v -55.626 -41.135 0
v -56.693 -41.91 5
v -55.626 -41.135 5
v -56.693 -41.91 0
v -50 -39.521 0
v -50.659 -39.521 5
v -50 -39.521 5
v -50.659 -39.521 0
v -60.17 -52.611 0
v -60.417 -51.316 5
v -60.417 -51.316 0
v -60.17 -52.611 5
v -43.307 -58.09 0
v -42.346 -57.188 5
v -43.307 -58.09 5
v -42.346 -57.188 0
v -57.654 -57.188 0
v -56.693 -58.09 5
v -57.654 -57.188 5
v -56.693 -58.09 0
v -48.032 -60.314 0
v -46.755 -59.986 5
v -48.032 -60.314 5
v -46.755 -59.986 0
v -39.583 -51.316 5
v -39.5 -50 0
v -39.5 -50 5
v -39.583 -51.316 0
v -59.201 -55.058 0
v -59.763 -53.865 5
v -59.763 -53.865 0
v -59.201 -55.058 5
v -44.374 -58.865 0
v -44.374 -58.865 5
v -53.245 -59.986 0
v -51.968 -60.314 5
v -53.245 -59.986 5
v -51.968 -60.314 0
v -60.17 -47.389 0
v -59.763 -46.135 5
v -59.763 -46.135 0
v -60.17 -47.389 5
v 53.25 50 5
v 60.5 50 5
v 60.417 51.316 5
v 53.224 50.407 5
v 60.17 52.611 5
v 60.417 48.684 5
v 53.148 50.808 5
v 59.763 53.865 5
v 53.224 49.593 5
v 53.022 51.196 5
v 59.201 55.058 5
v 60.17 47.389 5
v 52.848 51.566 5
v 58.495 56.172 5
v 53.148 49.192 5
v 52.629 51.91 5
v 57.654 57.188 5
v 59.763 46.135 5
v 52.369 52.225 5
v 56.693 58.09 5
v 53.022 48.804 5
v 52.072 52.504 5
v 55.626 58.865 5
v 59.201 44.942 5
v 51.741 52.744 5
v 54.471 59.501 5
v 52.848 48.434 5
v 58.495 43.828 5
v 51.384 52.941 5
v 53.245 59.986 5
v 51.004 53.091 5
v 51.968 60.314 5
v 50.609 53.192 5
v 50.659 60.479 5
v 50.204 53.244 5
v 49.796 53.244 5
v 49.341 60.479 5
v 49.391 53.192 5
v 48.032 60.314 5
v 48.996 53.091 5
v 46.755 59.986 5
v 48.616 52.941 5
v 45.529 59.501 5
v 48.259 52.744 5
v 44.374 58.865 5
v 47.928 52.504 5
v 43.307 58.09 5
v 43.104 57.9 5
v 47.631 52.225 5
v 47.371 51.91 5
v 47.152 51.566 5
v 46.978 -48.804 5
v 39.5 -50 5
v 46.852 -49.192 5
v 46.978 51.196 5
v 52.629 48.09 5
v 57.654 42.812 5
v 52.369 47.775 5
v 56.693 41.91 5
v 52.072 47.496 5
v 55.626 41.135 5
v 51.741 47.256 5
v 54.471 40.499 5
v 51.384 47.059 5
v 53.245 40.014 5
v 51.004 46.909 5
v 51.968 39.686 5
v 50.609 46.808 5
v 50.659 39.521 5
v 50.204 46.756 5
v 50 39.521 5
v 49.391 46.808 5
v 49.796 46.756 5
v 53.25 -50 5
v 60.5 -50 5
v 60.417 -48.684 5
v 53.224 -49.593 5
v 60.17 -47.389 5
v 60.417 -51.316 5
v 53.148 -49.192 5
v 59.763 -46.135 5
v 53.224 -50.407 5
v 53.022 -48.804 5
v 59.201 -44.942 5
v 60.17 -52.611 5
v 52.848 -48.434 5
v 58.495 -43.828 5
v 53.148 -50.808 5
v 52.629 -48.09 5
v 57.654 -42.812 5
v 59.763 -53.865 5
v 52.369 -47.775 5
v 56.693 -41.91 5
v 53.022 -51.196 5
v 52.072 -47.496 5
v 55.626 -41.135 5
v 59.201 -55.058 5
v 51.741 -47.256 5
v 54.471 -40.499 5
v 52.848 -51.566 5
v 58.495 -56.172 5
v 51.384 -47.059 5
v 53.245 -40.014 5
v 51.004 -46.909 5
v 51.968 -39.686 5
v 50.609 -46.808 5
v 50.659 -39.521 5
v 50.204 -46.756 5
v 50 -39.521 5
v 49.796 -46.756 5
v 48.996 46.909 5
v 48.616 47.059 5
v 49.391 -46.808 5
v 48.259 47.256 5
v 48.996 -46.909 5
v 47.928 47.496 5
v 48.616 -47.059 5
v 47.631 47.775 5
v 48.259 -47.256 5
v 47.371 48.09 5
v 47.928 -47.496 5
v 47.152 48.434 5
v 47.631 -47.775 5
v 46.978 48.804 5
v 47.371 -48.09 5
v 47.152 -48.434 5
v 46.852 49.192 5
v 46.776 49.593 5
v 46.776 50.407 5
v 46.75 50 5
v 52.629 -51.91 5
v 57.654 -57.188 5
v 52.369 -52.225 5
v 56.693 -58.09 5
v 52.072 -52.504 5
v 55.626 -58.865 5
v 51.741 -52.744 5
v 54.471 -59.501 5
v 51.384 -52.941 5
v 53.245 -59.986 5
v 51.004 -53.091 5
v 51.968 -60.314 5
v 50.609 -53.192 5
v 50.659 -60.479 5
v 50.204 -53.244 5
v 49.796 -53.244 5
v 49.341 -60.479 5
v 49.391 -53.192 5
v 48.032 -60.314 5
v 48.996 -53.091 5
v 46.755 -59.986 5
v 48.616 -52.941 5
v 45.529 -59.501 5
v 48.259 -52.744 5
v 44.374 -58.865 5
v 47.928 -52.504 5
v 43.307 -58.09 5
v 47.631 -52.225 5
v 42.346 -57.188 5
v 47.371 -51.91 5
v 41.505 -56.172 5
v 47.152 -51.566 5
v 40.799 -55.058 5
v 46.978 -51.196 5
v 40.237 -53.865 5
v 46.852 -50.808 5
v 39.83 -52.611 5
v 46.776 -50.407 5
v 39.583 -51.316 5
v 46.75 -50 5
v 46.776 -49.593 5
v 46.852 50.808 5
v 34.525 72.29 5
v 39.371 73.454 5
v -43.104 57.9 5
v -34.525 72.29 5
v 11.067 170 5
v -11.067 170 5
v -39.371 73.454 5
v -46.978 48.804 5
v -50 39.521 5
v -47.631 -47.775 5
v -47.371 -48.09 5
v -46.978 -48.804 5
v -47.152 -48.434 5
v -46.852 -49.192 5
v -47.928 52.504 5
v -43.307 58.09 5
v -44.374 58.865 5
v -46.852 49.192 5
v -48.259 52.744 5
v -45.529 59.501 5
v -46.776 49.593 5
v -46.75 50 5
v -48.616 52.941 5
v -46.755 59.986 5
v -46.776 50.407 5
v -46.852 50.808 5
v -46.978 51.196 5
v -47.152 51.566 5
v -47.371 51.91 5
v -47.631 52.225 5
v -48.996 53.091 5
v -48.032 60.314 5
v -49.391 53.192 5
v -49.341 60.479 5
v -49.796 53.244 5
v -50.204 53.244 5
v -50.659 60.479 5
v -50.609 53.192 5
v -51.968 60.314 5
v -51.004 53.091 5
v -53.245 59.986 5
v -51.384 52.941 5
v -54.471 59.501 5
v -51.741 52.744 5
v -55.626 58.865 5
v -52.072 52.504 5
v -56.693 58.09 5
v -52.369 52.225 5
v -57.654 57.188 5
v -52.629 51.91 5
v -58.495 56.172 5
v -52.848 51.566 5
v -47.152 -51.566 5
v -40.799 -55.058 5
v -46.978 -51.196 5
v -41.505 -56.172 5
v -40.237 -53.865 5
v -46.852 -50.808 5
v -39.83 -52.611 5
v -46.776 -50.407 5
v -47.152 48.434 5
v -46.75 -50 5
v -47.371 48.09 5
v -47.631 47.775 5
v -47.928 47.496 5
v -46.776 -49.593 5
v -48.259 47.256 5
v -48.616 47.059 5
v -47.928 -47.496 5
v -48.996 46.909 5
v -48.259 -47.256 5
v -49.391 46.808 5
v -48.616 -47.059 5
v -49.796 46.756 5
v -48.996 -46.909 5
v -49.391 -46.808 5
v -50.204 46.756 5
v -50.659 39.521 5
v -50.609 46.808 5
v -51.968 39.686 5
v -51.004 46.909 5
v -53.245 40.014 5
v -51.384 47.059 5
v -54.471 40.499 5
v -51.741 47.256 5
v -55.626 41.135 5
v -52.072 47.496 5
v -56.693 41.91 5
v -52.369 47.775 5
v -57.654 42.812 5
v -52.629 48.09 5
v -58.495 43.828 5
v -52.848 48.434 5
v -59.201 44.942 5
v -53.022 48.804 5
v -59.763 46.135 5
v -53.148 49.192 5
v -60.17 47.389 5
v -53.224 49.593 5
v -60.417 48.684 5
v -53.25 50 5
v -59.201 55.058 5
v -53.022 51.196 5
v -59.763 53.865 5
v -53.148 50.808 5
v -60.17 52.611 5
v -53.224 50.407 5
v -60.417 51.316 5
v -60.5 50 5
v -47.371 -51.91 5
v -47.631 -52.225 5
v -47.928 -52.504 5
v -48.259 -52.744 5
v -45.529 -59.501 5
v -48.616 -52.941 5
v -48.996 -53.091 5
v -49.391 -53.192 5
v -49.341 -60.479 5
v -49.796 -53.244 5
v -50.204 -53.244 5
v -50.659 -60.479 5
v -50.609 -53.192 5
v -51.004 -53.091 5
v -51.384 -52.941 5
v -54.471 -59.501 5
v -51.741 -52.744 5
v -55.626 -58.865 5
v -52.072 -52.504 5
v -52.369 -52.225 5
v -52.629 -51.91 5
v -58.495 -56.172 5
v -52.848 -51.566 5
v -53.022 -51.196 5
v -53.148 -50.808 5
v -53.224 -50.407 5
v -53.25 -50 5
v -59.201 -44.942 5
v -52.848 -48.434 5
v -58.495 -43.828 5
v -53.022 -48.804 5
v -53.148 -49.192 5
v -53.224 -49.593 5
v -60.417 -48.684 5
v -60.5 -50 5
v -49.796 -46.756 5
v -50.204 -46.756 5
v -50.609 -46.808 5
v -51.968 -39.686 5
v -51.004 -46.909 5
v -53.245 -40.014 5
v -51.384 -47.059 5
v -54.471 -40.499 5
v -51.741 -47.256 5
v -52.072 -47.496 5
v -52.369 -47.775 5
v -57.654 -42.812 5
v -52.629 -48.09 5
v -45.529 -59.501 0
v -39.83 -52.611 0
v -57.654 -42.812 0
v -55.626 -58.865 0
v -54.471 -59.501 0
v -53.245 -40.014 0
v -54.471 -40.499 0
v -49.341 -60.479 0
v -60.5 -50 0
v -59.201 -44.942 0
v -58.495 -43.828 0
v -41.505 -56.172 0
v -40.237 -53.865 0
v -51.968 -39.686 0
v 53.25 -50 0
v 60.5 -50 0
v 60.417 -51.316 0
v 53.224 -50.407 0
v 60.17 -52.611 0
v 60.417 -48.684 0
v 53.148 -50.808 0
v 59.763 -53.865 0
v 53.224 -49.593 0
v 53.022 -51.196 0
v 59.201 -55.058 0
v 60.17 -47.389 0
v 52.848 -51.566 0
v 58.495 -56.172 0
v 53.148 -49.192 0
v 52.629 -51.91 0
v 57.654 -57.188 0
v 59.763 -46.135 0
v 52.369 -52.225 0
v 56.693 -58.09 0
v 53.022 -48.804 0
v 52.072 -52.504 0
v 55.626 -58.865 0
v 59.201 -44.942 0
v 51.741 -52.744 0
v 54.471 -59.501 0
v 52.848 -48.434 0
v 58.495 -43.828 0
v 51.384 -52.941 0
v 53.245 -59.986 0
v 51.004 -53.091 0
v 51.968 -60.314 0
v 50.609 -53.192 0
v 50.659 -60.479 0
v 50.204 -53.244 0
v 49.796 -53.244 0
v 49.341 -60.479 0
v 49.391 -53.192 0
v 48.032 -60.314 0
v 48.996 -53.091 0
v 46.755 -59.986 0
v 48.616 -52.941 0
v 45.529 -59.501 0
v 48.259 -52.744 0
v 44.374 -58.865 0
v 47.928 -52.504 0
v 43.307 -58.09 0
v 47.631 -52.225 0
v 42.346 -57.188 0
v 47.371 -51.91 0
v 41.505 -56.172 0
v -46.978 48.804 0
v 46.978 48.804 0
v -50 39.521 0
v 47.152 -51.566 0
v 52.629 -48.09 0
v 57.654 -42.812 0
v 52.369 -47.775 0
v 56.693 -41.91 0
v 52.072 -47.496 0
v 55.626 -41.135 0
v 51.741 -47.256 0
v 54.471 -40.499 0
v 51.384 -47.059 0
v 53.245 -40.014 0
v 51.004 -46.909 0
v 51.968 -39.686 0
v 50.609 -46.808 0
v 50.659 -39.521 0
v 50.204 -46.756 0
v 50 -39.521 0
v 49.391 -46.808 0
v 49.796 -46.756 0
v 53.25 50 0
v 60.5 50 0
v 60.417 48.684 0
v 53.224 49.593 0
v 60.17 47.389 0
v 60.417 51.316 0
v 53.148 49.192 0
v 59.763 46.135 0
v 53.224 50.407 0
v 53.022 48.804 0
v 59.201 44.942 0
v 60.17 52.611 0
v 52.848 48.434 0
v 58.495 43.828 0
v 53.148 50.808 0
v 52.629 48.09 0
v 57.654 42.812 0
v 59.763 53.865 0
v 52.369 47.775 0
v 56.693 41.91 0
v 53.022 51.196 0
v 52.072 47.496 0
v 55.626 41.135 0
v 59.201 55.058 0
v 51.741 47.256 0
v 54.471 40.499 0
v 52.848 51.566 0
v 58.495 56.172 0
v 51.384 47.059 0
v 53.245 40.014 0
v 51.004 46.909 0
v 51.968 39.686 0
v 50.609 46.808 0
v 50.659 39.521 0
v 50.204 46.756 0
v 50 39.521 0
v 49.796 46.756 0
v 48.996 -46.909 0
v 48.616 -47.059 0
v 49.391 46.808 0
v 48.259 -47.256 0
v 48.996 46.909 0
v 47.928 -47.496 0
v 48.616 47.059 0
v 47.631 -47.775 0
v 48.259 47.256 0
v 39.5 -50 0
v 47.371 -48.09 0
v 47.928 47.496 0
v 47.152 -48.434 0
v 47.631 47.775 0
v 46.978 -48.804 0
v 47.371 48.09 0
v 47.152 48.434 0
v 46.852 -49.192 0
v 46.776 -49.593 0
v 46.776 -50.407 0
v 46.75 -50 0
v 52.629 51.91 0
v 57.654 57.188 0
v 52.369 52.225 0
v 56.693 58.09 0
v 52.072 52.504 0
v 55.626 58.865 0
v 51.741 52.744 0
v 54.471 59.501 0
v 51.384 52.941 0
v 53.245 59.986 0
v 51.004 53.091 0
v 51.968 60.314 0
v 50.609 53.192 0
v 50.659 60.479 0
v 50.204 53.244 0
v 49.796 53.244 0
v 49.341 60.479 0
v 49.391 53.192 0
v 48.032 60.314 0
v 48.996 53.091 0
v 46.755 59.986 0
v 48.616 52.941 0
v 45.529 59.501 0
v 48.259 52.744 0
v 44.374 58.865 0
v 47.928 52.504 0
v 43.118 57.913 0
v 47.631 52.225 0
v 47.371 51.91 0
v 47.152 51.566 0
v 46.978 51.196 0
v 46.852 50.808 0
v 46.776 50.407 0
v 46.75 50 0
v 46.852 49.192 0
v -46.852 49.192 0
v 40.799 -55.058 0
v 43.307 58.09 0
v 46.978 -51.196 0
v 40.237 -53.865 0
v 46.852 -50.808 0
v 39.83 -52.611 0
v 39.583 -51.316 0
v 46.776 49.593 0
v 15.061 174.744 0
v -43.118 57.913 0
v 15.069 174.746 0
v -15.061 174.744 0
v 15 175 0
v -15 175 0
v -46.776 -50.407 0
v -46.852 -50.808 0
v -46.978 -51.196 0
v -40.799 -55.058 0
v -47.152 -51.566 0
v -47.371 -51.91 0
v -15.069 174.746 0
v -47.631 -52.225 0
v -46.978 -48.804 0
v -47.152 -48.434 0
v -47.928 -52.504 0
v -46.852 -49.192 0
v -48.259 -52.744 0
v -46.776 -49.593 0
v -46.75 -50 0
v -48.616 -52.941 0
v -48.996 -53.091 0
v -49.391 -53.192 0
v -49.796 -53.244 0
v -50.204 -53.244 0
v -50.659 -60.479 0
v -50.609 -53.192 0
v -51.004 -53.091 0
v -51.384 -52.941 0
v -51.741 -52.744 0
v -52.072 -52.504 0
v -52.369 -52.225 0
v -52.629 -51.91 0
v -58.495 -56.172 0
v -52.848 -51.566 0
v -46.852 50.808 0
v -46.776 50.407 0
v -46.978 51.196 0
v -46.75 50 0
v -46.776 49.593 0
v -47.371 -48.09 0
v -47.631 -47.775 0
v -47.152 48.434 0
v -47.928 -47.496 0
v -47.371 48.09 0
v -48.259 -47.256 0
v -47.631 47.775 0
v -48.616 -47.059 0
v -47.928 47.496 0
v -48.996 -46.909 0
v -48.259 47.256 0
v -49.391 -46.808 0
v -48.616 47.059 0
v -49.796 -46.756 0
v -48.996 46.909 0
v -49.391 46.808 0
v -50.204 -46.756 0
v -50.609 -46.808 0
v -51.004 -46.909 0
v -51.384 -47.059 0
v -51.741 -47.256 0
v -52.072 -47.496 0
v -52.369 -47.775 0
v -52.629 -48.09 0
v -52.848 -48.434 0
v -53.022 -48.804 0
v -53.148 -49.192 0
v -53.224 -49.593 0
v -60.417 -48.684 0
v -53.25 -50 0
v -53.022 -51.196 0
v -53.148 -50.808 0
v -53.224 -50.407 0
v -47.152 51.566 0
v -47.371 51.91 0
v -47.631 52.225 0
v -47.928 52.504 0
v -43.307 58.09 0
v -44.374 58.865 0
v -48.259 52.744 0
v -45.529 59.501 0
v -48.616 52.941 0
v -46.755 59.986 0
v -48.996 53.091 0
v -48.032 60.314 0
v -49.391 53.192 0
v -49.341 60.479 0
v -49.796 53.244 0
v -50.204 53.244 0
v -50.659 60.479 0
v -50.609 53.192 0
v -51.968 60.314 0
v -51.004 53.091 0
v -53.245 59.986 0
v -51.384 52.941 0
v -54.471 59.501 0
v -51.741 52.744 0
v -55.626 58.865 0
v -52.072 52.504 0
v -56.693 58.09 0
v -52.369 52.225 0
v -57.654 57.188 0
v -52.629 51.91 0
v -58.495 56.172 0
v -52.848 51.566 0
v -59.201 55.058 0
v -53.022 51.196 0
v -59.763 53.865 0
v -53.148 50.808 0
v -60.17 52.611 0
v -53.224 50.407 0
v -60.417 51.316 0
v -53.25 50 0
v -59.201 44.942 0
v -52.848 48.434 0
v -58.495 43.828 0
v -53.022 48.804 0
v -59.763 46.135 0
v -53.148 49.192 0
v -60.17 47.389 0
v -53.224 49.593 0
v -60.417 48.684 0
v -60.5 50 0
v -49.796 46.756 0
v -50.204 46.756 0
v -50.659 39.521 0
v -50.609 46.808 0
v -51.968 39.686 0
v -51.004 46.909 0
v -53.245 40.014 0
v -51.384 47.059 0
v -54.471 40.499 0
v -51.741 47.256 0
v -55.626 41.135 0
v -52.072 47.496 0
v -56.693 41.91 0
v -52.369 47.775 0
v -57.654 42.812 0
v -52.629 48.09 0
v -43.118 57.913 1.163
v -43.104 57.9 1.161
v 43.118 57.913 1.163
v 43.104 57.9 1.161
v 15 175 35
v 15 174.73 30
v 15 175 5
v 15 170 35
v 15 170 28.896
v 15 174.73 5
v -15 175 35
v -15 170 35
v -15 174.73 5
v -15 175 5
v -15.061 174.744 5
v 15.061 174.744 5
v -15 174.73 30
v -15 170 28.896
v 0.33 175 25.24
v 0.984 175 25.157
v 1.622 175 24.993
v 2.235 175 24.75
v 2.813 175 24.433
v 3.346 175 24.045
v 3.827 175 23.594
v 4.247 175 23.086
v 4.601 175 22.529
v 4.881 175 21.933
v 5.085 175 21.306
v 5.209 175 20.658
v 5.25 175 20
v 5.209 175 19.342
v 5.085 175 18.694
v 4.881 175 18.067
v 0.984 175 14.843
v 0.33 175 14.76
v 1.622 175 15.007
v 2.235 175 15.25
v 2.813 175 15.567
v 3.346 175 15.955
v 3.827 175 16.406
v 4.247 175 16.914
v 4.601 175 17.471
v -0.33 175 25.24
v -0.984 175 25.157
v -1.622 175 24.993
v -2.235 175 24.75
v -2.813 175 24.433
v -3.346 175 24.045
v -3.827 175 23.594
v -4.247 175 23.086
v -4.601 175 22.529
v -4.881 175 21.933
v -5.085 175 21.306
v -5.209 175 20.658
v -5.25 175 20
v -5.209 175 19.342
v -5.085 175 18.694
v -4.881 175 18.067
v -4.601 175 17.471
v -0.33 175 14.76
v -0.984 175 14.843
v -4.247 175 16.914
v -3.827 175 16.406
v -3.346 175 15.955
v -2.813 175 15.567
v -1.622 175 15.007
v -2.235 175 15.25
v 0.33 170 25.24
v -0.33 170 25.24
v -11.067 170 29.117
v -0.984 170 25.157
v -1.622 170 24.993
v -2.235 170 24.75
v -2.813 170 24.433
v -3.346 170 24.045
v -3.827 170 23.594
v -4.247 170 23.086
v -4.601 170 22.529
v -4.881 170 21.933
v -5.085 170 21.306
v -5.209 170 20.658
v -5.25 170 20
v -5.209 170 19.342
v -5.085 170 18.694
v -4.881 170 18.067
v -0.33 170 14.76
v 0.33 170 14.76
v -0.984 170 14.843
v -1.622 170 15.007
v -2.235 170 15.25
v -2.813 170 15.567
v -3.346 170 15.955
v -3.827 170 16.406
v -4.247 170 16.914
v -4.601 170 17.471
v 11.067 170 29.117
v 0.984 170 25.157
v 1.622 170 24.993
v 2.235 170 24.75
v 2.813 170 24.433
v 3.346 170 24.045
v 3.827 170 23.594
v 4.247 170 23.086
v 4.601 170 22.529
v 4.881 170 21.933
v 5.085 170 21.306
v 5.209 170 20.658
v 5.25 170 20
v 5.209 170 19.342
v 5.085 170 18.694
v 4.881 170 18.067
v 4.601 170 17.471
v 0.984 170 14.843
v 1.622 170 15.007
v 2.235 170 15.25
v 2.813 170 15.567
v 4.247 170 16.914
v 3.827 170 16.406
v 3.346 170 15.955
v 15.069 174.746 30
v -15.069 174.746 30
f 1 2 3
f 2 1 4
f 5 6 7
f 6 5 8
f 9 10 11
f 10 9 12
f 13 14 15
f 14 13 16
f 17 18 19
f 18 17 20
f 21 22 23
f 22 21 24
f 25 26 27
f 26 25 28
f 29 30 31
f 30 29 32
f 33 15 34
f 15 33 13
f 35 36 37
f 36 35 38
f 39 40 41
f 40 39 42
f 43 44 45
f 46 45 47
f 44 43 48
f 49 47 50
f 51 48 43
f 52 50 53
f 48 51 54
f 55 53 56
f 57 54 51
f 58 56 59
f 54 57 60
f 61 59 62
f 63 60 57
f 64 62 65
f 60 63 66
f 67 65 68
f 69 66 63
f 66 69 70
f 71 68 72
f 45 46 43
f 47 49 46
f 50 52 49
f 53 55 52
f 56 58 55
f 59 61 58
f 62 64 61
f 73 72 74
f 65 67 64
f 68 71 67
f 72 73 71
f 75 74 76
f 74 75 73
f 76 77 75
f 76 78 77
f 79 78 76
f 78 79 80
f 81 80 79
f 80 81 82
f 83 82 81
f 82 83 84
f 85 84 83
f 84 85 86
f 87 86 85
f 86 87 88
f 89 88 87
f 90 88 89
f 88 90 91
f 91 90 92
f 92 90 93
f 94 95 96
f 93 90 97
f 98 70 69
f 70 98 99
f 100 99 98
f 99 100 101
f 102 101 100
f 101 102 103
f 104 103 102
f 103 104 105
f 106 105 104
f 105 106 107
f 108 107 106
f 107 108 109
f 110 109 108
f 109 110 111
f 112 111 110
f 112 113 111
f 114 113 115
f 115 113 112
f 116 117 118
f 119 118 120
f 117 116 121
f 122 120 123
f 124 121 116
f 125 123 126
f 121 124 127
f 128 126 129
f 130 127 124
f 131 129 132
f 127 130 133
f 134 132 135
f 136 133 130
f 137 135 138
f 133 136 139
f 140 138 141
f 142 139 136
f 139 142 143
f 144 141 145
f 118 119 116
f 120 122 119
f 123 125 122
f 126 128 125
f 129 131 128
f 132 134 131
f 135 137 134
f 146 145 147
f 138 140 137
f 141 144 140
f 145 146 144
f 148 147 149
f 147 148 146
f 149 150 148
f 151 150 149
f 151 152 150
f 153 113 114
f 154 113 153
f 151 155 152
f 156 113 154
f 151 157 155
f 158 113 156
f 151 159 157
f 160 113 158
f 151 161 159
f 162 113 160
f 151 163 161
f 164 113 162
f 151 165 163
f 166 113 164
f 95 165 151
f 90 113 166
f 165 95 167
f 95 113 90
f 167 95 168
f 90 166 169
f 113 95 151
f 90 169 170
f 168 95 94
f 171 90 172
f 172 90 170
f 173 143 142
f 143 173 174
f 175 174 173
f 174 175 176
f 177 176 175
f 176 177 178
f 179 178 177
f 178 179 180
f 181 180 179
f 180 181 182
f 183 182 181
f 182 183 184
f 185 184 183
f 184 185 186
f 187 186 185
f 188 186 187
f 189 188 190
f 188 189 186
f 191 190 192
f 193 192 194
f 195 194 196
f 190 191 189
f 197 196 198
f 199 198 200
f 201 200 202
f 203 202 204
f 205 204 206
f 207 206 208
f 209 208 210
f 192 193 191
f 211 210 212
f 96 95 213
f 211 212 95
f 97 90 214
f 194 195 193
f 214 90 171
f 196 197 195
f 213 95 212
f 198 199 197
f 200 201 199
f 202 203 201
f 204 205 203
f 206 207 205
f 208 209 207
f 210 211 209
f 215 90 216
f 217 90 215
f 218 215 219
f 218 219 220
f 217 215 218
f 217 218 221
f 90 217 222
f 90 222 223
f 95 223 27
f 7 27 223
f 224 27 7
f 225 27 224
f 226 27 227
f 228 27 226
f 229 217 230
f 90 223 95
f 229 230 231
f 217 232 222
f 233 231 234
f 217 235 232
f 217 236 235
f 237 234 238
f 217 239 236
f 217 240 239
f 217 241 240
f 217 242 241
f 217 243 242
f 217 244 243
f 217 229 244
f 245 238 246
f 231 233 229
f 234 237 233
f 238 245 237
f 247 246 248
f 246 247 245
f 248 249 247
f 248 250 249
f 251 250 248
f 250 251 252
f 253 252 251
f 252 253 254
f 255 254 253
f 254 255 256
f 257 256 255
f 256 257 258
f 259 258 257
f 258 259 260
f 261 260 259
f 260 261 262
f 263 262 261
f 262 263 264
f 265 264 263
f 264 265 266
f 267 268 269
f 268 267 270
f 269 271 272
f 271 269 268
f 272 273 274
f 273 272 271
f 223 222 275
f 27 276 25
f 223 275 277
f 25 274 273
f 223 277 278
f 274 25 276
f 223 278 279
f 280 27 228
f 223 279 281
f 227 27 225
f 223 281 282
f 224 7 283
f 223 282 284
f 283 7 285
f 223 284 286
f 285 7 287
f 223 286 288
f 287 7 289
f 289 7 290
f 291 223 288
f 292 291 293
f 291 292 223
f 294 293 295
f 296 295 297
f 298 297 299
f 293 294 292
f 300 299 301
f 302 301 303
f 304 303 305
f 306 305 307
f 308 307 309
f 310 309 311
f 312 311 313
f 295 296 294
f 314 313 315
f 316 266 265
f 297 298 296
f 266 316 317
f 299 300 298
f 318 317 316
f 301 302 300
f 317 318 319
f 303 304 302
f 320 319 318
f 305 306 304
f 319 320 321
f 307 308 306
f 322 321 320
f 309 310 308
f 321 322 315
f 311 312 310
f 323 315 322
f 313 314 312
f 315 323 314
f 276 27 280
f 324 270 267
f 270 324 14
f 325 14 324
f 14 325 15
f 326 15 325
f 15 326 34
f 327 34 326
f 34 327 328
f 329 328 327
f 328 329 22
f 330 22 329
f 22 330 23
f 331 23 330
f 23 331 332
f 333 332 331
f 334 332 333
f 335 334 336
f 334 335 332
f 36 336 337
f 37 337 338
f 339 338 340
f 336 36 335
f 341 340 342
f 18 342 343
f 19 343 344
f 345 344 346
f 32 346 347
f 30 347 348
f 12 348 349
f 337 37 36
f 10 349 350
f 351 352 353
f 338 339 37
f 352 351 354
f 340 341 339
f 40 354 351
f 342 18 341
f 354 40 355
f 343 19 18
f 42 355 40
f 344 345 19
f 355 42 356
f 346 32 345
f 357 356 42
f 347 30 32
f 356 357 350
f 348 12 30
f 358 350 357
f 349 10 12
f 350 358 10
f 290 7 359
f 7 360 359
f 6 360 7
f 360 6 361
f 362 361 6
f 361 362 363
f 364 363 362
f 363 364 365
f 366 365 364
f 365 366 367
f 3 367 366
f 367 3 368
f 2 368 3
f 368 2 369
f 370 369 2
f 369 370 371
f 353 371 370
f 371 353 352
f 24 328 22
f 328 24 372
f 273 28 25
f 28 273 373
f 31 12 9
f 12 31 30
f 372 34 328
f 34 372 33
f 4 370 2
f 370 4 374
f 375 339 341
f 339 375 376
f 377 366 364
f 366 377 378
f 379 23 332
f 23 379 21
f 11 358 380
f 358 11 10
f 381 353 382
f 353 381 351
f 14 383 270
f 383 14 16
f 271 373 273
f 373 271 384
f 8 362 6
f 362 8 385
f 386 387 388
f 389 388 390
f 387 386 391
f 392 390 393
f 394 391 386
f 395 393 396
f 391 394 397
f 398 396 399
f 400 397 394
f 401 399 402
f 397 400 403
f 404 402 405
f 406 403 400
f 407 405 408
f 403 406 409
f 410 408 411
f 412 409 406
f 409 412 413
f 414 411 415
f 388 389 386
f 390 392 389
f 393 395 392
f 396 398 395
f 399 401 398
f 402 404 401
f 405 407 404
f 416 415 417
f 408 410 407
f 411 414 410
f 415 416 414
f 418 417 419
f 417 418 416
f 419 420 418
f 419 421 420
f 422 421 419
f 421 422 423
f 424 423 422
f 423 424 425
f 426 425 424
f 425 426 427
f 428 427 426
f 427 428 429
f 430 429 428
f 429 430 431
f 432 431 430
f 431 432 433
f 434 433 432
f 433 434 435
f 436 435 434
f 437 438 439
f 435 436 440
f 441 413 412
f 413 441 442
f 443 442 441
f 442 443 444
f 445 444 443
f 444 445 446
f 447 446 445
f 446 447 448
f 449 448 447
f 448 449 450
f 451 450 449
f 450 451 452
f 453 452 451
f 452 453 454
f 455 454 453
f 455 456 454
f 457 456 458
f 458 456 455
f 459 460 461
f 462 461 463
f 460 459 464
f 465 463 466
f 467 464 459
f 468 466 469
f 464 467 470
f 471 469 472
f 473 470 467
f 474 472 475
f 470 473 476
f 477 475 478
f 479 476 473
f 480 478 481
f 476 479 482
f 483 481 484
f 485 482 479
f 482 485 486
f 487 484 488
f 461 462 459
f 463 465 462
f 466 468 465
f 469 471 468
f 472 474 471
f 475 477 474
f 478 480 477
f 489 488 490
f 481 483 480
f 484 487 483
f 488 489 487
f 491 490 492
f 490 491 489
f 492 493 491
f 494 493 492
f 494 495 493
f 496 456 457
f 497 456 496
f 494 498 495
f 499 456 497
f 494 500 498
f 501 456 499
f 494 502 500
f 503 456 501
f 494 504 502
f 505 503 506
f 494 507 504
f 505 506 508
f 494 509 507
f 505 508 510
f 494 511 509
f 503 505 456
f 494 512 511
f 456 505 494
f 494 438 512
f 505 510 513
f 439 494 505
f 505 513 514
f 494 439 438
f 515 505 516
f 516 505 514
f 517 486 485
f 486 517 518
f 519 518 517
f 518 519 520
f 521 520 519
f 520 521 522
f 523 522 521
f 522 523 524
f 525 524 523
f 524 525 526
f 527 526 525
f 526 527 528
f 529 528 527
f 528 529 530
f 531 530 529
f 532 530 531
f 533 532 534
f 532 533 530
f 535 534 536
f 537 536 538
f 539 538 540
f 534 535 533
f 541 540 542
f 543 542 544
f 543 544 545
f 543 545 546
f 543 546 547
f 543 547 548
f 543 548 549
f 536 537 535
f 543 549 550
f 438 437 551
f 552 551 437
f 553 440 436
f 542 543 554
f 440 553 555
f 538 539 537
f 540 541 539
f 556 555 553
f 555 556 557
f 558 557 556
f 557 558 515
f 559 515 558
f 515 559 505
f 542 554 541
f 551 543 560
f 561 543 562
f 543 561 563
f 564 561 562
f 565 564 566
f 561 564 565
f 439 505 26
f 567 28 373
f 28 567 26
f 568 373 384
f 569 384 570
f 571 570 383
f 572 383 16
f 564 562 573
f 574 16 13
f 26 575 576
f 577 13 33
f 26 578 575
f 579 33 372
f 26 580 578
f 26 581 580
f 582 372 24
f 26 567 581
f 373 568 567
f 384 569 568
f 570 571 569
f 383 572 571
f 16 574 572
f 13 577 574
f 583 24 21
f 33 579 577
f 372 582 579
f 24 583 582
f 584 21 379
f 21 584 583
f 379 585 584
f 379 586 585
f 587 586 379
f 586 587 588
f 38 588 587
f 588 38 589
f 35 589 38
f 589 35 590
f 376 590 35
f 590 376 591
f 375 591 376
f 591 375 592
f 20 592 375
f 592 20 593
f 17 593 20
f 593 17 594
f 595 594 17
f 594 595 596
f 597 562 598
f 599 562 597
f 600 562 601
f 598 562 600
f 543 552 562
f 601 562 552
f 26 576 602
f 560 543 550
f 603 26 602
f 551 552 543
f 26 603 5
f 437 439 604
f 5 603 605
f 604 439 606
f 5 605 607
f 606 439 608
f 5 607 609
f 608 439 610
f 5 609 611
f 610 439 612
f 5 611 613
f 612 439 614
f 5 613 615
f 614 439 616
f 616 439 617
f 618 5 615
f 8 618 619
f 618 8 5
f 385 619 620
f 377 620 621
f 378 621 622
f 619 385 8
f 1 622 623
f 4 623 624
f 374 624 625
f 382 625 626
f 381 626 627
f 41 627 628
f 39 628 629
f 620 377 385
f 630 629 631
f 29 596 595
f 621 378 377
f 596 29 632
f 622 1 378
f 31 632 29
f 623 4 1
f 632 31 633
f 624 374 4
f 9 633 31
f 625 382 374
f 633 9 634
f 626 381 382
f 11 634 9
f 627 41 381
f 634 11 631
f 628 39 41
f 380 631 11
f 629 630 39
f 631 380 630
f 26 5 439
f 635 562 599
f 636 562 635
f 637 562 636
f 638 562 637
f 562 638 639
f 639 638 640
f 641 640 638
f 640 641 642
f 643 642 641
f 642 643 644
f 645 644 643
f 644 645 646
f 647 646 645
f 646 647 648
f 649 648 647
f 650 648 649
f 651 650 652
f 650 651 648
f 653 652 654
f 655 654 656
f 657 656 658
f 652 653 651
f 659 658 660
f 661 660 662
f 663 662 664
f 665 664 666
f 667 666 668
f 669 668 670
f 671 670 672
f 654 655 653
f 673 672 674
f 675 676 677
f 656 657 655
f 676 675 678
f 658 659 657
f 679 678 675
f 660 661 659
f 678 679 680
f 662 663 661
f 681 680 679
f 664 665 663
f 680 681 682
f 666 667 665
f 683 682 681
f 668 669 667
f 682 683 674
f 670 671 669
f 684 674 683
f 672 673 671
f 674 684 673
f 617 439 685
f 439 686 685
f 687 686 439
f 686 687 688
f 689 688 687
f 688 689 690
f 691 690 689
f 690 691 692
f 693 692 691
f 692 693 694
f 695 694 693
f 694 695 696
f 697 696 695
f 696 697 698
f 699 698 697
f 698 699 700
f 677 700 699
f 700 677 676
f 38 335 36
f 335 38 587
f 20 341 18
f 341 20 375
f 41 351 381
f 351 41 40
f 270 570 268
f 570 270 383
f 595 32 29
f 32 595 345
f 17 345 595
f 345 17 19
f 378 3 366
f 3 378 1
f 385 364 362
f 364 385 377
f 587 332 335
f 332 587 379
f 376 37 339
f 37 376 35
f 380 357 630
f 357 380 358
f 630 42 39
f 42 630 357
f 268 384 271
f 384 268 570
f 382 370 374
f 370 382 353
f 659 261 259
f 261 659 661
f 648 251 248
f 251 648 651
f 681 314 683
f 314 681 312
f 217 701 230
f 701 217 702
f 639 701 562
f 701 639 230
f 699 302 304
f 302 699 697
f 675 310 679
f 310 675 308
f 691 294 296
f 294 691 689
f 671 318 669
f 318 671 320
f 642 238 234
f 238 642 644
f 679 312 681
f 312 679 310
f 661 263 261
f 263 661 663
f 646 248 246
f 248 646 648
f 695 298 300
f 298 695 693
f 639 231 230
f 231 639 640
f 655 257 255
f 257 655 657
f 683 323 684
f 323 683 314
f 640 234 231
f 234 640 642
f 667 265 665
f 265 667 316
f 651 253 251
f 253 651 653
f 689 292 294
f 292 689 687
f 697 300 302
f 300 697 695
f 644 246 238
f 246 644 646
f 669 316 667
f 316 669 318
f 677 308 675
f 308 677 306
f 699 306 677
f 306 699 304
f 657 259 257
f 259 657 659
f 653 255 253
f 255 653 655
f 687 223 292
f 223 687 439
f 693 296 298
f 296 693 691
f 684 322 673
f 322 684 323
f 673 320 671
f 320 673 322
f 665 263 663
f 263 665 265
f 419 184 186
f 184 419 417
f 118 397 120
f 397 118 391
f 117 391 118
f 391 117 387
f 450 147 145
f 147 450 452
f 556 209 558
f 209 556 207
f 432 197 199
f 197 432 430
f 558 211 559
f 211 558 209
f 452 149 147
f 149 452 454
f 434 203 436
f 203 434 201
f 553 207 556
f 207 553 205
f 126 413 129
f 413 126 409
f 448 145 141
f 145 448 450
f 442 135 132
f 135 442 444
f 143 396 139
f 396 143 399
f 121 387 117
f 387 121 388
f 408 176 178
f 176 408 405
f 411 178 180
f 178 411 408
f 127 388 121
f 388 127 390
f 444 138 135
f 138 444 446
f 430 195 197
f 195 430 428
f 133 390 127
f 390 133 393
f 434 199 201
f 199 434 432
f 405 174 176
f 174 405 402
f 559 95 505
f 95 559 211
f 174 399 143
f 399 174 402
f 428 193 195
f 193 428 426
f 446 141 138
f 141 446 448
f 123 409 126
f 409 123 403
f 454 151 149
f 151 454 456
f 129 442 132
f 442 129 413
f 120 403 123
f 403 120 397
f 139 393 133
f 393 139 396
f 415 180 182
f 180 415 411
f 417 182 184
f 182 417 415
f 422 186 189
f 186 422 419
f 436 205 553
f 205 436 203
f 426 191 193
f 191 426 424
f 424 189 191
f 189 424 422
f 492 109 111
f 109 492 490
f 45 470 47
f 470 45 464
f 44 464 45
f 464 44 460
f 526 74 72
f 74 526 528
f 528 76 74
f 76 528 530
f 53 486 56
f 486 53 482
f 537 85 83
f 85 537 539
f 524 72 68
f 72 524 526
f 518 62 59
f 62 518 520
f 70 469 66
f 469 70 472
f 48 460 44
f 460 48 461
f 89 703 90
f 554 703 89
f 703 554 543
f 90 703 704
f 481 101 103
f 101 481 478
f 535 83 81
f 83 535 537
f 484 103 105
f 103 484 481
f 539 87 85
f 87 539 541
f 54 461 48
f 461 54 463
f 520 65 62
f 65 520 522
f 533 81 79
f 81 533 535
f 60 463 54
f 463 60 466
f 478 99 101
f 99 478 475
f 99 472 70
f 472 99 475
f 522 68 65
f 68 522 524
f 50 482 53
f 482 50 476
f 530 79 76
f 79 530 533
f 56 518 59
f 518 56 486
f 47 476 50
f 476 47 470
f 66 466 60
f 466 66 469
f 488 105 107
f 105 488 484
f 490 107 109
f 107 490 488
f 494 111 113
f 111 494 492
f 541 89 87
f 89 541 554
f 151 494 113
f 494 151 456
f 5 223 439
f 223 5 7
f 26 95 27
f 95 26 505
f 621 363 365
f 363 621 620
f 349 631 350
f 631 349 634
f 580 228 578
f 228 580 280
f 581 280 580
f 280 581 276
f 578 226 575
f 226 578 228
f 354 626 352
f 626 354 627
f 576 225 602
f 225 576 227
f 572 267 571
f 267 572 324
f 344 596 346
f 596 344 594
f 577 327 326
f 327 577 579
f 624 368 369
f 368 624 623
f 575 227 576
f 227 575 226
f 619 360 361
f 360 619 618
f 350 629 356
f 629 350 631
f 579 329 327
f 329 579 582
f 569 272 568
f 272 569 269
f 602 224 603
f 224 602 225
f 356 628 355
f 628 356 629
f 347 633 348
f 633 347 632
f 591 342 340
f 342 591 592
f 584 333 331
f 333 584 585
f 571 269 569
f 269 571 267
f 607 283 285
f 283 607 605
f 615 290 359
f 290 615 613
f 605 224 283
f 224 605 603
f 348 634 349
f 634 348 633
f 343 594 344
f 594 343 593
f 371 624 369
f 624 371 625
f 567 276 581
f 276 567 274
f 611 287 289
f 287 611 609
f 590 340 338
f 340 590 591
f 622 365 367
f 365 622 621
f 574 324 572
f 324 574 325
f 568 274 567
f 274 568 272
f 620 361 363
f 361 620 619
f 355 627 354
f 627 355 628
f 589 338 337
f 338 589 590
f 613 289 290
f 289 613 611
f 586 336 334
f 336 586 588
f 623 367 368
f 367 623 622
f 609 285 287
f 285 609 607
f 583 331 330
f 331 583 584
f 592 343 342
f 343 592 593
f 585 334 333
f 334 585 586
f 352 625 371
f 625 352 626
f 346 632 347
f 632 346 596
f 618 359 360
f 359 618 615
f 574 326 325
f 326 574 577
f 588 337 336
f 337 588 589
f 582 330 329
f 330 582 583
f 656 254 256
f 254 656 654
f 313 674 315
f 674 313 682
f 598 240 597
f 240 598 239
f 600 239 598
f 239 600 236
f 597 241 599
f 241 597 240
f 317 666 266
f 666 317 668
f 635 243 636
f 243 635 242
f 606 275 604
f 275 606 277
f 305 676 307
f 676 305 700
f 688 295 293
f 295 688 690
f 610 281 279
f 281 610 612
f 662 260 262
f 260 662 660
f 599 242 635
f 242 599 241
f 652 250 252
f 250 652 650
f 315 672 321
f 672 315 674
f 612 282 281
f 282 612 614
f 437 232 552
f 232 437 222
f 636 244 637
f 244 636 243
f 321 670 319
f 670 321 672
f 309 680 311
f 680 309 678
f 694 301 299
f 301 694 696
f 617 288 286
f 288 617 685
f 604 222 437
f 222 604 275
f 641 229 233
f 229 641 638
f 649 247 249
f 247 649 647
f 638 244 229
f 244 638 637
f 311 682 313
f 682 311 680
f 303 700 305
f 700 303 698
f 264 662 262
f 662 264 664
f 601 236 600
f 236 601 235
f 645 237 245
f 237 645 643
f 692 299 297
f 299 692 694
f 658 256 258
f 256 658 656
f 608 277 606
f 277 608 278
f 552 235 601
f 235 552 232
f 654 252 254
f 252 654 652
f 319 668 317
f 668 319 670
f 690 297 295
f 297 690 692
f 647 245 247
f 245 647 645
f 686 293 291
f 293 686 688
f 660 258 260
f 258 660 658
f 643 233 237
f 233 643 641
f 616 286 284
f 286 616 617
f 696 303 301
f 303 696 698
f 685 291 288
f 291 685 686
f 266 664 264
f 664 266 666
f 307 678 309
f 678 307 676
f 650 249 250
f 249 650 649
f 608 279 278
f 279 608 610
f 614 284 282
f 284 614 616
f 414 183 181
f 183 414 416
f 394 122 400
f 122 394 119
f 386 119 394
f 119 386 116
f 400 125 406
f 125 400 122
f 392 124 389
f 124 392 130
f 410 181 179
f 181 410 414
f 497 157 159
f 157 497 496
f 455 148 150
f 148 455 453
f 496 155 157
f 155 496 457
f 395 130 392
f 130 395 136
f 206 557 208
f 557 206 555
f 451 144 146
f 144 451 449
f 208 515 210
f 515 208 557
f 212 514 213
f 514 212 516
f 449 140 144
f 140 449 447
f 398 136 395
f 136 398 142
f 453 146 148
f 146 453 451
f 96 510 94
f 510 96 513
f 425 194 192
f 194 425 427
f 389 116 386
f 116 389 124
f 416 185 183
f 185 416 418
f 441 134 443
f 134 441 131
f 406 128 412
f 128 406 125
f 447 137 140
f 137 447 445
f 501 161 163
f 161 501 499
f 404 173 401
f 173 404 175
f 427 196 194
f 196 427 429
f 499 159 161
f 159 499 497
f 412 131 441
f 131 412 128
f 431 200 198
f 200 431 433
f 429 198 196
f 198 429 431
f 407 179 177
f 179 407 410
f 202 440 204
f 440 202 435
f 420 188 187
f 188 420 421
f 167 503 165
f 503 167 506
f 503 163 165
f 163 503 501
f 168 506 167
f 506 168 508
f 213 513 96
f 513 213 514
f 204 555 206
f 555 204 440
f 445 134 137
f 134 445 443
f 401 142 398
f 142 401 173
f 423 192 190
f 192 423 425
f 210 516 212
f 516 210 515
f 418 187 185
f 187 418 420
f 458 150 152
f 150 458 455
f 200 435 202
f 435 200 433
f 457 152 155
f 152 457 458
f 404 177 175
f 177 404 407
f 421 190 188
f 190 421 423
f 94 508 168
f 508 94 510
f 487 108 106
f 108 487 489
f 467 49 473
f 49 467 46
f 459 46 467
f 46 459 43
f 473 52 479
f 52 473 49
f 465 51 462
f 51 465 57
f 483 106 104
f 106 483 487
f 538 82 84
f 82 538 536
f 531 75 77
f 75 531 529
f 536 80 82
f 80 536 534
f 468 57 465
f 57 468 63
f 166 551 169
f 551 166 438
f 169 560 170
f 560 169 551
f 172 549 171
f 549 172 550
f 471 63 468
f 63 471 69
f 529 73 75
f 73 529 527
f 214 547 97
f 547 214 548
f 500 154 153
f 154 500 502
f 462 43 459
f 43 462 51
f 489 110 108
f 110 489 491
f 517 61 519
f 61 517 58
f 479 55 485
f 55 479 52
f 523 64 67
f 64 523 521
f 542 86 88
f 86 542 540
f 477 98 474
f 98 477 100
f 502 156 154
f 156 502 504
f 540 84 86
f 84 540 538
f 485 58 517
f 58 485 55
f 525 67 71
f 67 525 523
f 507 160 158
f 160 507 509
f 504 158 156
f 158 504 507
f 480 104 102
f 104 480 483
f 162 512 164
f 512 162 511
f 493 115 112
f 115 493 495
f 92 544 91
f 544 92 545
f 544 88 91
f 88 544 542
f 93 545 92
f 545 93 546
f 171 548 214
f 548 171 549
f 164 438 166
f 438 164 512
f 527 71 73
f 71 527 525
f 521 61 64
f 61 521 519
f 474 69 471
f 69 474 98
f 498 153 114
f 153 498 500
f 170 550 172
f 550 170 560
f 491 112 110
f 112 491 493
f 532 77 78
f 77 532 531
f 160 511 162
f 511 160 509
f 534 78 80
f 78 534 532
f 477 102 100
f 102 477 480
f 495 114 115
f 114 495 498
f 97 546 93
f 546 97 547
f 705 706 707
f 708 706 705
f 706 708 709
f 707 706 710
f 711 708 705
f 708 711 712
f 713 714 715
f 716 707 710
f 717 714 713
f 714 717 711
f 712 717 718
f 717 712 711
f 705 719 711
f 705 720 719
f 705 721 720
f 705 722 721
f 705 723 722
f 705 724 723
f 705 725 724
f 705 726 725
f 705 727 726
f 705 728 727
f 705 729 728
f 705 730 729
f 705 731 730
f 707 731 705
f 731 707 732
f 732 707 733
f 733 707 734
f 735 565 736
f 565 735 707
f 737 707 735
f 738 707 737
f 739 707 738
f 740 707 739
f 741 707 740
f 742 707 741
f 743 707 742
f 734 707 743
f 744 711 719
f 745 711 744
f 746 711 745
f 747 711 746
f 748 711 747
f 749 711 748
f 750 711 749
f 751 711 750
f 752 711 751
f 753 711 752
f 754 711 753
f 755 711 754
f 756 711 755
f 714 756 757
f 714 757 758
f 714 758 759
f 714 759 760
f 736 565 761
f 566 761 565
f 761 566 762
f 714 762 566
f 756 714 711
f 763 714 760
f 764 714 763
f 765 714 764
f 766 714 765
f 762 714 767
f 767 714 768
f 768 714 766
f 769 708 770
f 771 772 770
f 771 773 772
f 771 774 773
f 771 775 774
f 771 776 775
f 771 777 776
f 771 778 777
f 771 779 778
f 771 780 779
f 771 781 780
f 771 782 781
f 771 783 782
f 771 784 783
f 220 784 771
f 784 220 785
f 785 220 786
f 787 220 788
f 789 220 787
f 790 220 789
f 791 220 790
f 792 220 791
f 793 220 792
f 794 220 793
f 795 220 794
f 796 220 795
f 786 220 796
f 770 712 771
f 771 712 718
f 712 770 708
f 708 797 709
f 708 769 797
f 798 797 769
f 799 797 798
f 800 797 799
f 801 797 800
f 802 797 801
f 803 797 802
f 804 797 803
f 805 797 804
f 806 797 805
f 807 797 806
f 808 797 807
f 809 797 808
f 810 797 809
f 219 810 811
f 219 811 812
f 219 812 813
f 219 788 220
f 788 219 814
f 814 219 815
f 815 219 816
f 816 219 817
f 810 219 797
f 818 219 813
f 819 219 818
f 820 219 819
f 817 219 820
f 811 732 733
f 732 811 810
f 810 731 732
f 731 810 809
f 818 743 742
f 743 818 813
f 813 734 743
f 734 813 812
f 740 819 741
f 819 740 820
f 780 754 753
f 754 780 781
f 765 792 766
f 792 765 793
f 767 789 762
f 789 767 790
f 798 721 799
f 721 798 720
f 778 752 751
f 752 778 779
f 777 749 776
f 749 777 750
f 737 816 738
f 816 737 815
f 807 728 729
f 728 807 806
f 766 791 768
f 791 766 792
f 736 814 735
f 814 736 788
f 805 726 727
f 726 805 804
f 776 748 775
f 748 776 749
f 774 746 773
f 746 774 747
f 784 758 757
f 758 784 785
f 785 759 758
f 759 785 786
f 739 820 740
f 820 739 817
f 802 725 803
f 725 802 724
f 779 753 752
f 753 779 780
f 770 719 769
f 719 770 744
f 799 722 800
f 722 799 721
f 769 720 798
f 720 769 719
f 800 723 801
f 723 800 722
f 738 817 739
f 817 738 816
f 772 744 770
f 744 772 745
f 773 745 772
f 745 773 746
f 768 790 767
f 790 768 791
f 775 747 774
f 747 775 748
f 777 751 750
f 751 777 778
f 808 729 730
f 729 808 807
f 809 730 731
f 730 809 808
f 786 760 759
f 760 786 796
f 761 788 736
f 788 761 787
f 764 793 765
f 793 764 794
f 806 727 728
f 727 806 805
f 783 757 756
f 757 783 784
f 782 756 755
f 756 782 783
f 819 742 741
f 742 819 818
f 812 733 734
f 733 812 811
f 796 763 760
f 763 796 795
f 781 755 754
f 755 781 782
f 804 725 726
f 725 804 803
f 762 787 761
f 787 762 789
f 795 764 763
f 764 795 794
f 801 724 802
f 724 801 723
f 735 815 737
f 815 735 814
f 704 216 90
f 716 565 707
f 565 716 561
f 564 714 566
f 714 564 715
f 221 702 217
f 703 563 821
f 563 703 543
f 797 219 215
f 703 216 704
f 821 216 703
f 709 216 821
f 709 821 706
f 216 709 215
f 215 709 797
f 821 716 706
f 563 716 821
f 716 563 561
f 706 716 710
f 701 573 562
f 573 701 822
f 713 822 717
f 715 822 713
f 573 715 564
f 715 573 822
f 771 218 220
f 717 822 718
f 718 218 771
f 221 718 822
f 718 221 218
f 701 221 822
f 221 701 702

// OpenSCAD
$fn = 50;

module vesa_mount(thickness = 5, spacing = 100, bolt_diameter = 6) {
  module at_bolt_holes() {
    for (x = [-spacing/2, +spacing/2])
    for (y = [-spacing/2, +spacing/2])
    translate([x, y, 0])
    children();
  }

  difference() {
    union() {
      at_bolt_holes() cylinder(d=bolt_diameter + 15, h=thickness);

      translate([0,0,thickness/2])
      cube([spacing, spacing, thickness], center=true);
    }
    
    at_bolt_holes() translate([0,0,-0.01]) cylinder(d=bolt_diameter + 0.5, h=thickness+0.02);
  }
}

module light_bracket() {
  wide_width = 90;
  length = 125;
  thickness = 5;
  narrow_width = 10 + 2*5 + 2*thickness; 

  module gusset() {
    translate([wide_width/2-0.75,3.2,0])
    rotate([0,-90,13.5])
    linear_extrude(thickness)
    polygon(points=[
      [0,0],
      [narrow_width, length],
      [0, length]
    ]);
  }

  linear_extrude(thickness)
  polygon(points=[
    [+narrow_width/2, +length],
    [+wide_width/2, 0],
    [-wide_width/2, 0],
    [-narrow_width/2, +length],
  ]);

  translate([0, 125 - thickness/2, narrow_width/2 + thickness])
  difference() {
    cube([narrow_width, thickness, narrow_width], center=true);

    translate([0,-thickness/2 - 0.1,0])
    rotate([-90,0,0])
    cylinder(d=10.5, h=thickness+0.2);
  }
  
  gusset();
  mirror([1,0,0]) gusset();
}

vesa_mount();
translate([0, 100/2, 0])
light_bracket();
